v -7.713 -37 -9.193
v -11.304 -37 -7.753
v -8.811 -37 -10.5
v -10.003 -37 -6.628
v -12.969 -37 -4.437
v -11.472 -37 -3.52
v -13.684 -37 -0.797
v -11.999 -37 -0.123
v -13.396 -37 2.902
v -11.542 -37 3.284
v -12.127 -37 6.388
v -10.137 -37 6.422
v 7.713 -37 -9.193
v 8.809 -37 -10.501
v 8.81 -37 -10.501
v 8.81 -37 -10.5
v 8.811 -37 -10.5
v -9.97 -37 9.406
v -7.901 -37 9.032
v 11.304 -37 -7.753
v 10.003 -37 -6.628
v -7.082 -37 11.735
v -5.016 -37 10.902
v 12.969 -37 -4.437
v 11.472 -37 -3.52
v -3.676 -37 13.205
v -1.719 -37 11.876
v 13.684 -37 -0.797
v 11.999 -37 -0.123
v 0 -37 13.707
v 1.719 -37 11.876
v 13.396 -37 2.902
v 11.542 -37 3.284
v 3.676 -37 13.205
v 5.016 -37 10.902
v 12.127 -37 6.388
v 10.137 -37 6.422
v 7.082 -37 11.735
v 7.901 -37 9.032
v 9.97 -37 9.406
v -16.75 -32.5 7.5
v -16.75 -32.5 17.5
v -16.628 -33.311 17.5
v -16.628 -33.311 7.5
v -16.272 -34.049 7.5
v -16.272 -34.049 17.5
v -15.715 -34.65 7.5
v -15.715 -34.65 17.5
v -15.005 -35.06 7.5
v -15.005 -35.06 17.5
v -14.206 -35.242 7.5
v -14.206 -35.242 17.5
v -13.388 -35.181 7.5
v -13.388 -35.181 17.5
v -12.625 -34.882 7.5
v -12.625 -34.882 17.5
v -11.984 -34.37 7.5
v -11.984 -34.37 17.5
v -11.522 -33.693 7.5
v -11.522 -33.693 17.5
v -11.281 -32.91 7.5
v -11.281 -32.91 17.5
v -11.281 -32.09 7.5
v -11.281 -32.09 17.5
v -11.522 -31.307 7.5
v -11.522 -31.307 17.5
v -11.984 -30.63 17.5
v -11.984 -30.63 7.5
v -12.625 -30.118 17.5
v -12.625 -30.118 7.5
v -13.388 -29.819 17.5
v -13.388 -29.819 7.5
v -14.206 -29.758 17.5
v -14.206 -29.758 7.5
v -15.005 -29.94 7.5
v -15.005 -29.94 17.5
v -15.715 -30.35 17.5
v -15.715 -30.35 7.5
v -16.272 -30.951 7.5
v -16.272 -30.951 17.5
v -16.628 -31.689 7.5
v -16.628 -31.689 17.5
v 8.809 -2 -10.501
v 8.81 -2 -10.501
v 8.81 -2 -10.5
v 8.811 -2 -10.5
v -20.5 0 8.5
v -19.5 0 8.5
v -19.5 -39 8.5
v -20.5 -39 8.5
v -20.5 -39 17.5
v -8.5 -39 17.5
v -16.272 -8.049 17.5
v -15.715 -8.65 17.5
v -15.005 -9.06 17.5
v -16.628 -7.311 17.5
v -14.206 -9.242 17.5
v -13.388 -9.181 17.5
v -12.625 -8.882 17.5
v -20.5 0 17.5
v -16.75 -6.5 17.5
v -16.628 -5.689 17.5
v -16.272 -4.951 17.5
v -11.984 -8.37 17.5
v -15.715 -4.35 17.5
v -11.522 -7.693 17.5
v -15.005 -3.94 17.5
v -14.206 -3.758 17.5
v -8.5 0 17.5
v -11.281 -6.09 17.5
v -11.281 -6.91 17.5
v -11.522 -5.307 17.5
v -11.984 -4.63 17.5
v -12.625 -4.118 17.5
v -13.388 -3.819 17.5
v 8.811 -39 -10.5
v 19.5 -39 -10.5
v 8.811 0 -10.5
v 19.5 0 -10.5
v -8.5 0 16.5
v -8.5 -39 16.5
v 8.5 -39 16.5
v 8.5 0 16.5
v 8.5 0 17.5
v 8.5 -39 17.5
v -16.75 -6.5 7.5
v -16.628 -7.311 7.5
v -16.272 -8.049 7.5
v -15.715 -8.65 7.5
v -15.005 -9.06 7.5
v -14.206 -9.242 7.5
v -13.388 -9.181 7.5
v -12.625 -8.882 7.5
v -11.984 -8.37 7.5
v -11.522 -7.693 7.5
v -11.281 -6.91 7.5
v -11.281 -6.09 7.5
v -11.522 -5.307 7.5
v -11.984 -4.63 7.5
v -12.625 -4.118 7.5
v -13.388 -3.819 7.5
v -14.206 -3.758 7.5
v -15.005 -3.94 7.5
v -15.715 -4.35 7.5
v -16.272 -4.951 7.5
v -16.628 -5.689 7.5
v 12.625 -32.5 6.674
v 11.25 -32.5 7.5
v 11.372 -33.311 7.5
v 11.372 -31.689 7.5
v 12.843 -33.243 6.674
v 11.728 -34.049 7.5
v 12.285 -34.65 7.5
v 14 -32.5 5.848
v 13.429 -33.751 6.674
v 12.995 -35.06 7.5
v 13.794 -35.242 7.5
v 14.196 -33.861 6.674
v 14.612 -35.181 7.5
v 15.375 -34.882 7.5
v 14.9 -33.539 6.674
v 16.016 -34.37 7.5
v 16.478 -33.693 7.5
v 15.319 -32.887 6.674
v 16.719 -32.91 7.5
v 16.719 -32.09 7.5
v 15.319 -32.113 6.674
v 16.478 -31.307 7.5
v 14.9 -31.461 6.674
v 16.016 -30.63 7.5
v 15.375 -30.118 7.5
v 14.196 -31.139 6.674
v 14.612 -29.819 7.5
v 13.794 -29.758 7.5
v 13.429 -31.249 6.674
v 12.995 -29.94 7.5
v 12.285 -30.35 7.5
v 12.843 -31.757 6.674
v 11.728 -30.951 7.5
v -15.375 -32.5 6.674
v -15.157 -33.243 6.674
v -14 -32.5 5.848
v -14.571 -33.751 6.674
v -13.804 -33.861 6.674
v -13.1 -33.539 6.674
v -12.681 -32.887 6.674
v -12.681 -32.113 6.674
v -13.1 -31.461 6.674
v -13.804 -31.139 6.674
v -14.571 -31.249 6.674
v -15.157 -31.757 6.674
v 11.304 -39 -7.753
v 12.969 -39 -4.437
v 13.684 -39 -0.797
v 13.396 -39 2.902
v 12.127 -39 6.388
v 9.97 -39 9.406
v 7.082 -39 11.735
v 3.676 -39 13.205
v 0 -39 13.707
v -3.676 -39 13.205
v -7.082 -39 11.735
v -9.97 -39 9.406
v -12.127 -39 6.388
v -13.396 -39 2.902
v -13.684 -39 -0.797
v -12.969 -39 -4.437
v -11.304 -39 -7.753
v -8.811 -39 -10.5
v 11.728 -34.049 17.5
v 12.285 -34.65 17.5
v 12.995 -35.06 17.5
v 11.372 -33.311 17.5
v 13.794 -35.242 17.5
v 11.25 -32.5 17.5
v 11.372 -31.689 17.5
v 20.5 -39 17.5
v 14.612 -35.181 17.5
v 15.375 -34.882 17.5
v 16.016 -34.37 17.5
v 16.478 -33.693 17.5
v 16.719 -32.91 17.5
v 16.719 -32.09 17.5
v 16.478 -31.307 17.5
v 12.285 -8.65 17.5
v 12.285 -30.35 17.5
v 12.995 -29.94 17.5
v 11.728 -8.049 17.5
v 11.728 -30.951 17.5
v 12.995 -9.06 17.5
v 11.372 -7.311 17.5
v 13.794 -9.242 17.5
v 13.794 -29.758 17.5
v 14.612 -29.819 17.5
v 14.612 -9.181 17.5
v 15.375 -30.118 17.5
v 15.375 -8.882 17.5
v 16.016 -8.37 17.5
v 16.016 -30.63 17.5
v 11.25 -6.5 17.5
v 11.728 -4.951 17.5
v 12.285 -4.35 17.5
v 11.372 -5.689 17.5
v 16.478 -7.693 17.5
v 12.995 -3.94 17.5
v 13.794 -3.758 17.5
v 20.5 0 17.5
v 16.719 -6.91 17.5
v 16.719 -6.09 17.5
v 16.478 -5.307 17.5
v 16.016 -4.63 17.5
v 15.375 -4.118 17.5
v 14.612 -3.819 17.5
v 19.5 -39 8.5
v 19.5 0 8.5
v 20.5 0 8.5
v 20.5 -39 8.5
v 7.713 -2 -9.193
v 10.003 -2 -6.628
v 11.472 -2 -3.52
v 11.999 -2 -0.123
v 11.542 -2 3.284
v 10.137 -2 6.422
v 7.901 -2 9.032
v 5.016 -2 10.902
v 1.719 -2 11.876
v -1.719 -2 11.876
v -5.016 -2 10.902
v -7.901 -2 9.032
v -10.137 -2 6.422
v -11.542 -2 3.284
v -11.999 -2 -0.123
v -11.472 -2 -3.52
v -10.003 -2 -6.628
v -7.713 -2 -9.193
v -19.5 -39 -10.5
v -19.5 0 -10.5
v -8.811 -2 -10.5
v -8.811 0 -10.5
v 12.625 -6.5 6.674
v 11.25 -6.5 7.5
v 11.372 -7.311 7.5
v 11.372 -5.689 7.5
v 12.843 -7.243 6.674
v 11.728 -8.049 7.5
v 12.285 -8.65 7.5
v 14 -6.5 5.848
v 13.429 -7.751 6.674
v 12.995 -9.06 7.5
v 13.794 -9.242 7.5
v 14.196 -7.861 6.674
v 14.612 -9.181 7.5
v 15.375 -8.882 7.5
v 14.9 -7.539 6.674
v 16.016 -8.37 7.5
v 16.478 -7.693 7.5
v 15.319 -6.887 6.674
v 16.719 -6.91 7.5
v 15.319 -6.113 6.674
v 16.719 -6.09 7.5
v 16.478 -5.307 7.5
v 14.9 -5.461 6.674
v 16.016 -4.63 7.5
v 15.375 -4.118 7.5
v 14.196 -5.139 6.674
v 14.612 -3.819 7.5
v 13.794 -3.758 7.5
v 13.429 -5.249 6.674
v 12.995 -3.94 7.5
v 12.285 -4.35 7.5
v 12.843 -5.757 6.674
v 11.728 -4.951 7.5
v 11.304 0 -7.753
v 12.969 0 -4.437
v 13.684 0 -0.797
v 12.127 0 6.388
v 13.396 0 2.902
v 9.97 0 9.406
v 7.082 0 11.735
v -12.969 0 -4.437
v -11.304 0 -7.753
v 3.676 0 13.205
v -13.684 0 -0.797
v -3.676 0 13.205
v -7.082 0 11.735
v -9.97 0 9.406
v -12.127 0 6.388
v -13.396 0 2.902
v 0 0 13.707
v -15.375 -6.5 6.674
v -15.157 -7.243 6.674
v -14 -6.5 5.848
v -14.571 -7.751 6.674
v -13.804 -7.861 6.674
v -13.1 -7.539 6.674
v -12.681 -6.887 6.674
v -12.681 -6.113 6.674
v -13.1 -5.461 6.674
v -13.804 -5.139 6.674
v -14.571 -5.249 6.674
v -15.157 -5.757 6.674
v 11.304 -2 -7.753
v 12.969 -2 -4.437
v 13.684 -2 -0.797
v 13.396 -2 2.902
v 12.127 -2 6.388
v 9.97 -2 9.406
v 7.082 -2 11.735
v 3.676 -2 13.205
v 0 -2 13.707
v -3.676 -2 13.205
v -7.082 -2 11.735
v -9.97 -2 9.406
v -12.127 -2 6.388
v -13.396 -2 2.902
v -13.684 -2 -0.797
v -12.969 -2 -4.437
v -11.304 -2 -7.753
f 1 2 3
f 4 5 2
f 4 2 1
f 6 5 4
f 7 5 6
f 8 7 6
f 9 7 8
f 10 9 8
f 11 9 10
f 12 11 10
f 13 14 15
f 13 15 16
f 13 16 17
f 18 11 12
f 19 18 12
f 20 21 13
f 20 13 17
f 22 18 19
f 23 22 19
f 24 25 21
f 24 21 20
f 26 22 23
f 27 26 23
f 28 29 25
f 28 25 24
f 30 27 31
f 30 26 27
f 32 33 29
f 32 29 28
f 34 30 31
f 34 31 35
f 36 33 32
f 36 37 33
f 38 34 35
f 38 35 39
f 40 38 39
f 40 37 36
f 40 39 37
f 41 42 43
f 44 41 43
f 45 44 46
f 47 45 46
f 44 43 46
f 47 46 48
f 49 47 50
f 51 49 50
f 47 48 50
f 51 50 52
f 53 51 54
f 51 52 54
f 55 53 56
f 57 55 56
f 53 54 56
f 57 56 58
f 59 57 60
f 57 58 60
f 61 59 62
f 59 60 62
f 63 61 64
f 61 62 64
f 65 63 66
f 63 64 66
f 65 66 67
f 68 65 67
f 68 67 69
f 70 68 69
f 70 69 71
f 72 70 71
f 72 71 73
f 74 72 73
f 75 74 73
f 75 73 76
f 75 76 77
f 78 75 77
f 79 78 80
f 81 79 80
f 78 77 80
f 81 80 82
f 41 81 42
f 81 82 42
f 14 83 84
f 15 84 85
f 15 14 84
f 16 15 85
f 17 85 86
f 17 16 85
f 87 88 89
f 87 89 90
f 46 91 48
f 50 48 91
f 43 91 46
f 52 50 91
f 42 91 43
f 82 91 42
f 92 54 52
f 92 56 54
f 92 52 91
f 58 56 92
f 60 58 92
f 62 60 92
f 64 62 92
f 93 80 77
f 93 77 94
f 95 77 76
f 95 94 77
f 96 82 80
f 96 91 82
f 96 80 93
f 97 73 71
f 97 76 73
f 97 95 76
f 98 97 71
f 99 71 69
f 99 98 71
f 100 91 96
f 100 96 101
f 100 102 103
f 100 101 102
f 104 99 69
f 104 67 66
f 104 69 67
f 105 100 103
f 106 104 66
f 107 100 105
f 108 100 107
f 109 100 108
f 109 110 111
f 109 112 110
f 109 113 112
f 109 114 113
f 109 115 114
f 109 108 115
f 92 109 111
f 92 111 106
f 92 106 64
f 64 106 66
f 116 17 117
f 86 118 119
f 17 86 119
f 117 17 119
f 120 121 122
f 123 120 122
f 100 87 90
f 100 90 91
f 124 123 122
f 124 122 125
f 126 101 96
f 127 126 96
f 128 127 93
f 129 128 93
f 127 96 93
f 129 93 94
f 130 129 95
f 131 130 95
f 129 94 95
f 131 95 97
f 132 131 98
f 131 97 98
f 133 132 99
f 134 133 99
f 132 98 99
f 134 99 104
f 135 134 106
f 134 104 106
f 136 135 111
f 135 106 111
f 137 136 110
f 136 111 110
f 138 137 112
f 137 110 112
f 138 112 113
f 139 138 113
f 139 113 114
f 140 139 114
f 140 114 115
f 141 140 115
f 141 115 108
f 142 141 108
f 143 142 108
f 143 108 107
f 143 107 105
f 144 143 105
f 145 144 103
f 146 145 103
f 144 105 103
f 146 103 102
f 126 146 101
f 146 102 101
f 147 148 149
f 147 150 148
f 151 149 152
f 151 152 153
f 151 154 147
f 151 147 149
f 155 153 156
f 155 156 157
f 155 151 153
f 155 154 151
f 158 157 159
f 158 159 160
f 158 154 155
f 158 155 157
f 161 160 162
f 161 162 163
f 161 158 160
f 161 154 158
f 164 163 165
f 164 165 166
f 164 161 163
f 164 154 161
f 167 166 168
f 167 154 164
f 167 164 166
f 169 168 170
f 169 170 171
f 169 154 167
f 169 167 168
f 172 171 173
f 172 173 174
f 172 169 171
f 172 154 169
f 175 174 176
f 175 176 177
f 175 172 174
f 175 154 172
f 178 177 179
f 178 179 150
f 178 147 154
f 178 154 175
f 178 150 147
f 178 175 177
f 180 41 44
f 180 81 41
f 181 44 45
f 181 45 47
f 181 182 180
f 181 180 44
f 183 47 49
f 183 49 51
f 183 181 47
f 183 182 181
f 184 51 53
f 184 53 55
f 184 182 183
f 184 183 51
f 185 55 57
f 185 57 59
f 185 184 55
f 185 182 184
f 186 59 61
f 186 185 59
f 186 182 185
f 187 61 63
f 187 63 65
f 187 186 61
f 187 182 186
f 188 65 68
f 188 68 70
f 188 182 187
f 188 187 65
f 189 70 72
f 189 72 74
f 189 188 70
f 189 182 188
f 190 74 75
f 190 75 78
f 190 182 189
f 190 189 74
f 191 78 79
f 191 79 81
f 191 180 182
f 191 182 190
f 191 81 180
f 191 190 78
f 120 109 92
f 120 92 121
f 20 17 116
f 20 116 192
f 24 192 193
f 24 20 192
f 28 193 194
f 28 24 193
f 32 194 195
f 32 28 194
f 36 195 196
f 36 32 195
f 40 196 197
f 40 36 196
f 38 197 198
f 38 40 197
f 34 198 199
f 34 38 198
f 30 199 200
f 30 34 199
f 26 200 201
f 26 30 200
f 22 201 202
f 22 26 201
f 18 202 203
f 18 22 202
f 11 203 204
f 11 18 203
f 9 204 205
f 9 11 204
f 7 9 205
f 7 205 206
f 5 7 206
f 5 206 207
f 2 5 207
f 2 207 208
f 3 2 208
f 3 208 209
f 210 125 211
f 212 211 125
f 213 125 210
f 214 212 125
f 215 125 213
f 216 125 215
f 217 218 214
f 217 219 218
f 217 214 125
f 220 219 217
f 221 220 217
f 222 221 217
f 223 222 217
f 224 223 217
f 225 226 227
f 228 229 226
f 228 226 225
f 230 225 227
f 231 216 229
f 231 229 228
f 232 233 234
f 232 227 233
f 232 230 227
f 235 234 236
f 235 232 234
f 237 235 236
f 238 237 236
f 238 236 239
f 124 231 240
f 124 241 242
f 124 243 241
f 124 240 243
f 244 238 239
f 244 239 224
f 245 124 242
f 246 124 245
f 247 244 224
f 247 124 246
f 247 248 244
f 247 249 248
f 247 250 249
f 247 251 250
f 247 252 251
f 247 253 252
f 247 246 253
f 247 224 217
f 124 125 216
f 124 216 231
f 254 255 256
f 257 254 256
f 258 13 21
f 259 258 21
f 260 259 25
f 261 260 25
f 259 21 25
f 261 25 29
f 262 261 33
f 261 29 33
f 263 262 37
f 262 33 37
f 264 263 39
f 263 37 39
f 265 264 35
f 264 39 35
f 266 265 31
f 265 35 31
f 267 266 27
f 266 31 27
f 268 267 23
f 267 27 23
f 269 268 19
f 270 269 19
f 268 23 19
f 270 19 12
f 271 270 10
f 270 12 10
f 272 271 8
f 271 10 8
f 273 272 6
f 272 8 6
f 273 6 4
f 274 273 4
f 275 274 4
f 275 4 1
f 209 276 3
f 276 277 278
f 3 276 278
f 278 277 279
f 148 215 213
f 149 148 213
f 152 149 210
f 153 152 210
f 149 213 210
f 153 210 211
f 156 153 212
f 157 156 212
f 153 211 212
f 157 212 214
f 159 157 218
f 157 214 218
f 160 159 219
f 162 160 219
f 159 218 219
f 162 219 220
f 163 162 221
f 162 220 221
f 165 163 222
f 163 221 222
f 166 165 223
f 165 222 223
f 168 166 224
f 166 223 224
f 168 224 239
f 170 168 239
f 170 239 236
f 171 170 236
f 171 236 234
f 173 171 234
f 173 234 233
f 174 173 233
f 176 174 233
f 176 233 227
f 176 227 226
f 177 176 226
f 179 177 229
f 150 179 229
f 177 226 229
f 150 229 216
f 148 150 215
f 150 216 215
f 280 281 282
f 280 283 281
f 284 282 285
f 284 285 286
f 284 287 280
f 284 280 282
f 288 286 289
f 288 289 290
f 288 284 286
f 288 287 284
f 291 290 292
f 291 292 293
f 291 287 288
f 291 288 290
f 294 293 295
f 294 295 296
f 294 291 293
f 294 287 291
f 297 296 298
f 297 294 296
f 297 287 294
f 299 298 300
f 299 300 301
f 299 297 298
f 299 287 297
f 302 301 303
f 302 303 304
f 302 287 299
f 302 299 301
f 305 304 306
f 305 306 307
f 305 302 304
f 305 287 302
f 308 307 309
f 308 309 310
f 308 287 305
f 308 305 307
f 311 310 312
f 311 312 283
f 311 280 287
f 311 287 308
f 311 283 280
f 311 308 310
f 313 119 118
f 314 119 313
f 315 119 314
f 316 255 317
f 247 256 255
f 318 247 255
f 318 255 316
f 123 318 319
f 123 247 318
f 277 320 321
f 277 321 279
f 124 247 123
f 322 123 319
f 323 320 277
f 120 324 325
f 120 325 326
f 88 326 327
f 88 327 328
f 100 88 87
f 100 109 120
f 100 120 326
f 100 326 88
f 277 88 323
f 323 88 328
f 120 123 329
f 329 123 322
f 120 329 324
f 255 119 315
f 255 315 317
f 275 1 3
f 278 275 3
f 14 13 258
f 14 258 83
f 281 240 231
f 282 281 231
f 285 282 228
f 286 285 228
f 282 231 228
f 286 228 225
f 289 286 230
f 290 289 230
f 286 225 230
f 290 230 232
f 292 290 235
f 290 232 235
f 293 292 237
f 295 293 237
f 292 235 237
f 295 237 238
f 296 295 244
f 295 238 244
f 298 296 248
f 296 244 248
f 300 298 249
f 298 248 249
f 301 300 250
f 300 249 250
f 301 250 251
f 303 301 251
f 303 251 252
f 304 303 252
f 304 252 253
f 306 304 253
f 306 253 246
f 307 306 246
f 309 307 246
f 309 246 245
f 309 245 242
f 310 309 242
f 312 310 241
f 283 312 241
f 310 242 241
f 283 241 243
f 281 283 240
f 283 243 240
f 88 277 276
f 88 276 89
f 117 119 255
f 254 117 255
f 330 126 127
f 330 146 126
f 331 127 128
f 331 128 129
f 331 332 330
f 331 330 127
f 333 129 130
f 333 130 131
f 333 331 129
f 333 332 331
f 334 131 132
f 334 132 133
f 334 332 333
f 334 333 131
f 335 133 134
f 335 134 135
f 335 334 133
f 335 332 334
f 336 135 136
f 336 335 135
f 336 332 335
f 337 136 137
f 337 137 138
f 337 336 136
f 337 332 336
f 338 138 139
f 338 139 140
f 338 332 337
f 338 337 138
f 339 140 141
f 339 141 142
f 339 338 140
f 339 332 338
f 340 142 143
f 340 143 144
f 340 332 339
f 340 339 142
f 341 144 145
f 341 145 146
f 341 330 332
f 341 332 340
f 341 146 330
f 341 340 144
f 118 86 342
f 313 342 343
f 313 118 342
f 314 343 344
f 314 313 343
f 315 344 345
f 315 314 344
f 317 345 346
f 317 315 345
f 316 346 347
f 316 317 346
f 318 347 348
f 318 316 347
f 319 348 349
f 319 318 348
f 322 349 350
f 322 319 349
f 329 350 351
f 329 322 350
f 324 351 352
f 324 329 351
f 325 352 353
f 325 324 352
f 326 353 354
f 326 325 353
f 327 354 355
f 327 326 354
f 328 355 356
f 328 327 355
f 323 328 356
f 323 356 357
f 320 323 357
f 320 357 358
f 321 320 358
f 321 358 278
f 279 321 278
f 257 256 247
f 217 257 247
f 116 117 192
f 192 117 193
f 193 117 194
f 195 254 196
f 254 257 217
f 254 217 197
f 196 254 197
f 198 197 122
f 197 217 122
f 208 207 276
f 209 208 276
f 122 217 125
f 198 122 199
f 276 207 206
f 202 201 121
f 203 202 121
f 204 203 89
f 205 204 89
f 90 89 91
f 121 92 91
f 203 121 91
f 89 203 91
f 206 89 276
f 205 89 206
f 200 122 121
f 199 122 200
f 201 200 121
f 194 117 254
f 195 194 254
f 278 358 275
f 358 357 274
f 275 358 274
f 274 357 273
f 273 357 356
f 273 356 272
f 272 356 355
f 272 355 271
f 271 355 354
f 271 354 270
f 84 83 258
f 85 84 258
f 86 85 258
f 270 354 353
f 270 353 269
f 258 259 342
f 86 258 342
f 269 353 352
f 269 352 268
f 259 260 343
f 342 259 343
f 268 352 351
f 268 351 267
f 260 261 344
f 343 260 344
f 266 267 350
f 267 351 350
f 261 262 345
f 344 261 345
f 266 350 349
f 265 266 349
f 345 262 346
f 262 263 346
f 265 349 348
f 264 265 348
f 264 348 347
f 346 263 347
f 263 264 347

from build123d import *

# Parameters (mm, degrees)
PAD_DEPTH    = 39
PAD001_DEPTH = 35
SKETCH002_R  = 2.75
HOLE_DEPTH   = 10
HOLE_TIPS_R  = 2.75


with BuildPart() as part:
    # Sketch → Pad (new body)
    with BuildSketch(Plane.XZ):
        with BuildLine():
            ThreePointArc((8.810546, -10.5), (0, 13.706777), (-8.810546, -10.5))
            Line((-19.5, -10.5), (-8.810546, -10.5))
            Line((-19.5, -10.5), (-19.5, 8.5))
            Line((-19.5, 8.5), (-20.5, 8.5))
            Line((-20.5, 8.5), (-20.5, 17.5))
            Line((-20.5, 17.5), (-8.5, 17.5))
            Line((-8.5, 17.5), (-8.5, 16.5))
            Line((-8.5, 16.5), (8.5, 16.5))
            Line((8.5, 16.5), (8.5, 17.5))
            Line((8.5, 17.5), (20.5, 17.5))
            Line((20.5, 8.5), (20.5, 17.5))
            Line((19.5, 8.5), (20.5, 8.5))
            Line((19.5, -10.5), (19.5, 8.5))
            Line((8.810546, -10.5), (19.5, -10.5))
        make_face()
    extrude(amount=PAD_DEPTH)

    # Sketch001 (on DatumPlane) → Pad001 (join)
    with BuildSketch(Plane.XZ.offset(37)):
        with BuildLine():
            ThreePointArc((8.809308, -10.501039), (0.000808, 13.706777), (-8.810546, -10.5))
            Line((-7.713451, -9.192533), (-8.810546, -10.5))
            ThreePointArc((7.713451, -9.192533), (0, 12), (-7.713451, -9.192533))
            Line((7.713451, -9.192533), (8.809308, -10.501039))
        make_face()
    extrude(amount=-PAD001_DEPTH)

    # Sketch002 (on Face13 of Pad001) → Hole (cut)
    with BuildSketch(Plane(origin=(0, 0, 17.5), x_dir=(-1, 0, 0), z_dir=(0, 0, 1))):
        with Locations((-14, 32.5)):
            Circle(SKETCH002_R)
        with Locations((14, 32.5)):
            Circle(SKETCH002_R)
        with Locations((14, 6.5)):
            Circle(SKETCH002_R)
        with Locations((-14, 6.5)):
            Circle(SKETCH002_R)
    extrude(amount=-HOLE_DEPTH, mode=Mode.SUBTRACT)

    # Hole tips → Hole tip 1 section 0
    with BuildSketch(Plane(origin=(0, 0, 7.5), x_dir=(-1, 0, 0), z_dir=(0, 0, 1)), mode=Mode.PRIVATE) as hole_tip_1_s0:
        with Locations((-14, 32.5)):
            Circle(HOLE_TIPS_R)
    loft([hole_tip_1_s0.sketch, Vertex(14, -32.5, 5.847633)], mode=Mode.SUBTRACT)

    # Hole tips → Hole tip 2 section 0
    with BuildSketch(Plane(origin=(0, 0, 7.5), x_dir=(-1, 0, 0), z_dir=(0, 0, 1)), mode=Mode.PRIVATE) as hole_tip_2_s0:
        with Locations((14, 32.5)):
            Circle(HOLE_TIPS_R)
    loft([hole_tip_2_s0.sketch, Vertex(-14, -32.5, 5.847633)], mode=Mode.SUBTRACT)

    # Hole tips → Hole tip 3 section 0
    with BuildSketch(Plane(origin=(0, 0, 7.5), x_dir=(-1, 0, 0), z_dir=(0, 0, 1)), mode=Mode.PRIVATE) as hole_tip_3_s0:
        with Locations((14, 6.5)):
            Circle(HOLE_TIPS_R)
    loft([hole_tip_3_s0.sketch, Vertex(-14, -6.5, 5.847633)], mode=Mode.SUBTRACT)

    # Hole tips → Hole tip 4 section 0
    with BuildSketch(Plane(origin=(0, 0, 7.5), x_dir=(-1, 0, 0), z_dir=(0, 0, 1)), mode=Mode.PRIVATE) as hole_tip_4_s0:
        with Locations((-14, 6.5)):
            Circle(HOLE_TIPS_R)
    loft([hole_tip_4_s0.sketch, Vertex(14, -6.5, 5.847633)], mode=Mode.SUBTRACT)


solid = part.part
